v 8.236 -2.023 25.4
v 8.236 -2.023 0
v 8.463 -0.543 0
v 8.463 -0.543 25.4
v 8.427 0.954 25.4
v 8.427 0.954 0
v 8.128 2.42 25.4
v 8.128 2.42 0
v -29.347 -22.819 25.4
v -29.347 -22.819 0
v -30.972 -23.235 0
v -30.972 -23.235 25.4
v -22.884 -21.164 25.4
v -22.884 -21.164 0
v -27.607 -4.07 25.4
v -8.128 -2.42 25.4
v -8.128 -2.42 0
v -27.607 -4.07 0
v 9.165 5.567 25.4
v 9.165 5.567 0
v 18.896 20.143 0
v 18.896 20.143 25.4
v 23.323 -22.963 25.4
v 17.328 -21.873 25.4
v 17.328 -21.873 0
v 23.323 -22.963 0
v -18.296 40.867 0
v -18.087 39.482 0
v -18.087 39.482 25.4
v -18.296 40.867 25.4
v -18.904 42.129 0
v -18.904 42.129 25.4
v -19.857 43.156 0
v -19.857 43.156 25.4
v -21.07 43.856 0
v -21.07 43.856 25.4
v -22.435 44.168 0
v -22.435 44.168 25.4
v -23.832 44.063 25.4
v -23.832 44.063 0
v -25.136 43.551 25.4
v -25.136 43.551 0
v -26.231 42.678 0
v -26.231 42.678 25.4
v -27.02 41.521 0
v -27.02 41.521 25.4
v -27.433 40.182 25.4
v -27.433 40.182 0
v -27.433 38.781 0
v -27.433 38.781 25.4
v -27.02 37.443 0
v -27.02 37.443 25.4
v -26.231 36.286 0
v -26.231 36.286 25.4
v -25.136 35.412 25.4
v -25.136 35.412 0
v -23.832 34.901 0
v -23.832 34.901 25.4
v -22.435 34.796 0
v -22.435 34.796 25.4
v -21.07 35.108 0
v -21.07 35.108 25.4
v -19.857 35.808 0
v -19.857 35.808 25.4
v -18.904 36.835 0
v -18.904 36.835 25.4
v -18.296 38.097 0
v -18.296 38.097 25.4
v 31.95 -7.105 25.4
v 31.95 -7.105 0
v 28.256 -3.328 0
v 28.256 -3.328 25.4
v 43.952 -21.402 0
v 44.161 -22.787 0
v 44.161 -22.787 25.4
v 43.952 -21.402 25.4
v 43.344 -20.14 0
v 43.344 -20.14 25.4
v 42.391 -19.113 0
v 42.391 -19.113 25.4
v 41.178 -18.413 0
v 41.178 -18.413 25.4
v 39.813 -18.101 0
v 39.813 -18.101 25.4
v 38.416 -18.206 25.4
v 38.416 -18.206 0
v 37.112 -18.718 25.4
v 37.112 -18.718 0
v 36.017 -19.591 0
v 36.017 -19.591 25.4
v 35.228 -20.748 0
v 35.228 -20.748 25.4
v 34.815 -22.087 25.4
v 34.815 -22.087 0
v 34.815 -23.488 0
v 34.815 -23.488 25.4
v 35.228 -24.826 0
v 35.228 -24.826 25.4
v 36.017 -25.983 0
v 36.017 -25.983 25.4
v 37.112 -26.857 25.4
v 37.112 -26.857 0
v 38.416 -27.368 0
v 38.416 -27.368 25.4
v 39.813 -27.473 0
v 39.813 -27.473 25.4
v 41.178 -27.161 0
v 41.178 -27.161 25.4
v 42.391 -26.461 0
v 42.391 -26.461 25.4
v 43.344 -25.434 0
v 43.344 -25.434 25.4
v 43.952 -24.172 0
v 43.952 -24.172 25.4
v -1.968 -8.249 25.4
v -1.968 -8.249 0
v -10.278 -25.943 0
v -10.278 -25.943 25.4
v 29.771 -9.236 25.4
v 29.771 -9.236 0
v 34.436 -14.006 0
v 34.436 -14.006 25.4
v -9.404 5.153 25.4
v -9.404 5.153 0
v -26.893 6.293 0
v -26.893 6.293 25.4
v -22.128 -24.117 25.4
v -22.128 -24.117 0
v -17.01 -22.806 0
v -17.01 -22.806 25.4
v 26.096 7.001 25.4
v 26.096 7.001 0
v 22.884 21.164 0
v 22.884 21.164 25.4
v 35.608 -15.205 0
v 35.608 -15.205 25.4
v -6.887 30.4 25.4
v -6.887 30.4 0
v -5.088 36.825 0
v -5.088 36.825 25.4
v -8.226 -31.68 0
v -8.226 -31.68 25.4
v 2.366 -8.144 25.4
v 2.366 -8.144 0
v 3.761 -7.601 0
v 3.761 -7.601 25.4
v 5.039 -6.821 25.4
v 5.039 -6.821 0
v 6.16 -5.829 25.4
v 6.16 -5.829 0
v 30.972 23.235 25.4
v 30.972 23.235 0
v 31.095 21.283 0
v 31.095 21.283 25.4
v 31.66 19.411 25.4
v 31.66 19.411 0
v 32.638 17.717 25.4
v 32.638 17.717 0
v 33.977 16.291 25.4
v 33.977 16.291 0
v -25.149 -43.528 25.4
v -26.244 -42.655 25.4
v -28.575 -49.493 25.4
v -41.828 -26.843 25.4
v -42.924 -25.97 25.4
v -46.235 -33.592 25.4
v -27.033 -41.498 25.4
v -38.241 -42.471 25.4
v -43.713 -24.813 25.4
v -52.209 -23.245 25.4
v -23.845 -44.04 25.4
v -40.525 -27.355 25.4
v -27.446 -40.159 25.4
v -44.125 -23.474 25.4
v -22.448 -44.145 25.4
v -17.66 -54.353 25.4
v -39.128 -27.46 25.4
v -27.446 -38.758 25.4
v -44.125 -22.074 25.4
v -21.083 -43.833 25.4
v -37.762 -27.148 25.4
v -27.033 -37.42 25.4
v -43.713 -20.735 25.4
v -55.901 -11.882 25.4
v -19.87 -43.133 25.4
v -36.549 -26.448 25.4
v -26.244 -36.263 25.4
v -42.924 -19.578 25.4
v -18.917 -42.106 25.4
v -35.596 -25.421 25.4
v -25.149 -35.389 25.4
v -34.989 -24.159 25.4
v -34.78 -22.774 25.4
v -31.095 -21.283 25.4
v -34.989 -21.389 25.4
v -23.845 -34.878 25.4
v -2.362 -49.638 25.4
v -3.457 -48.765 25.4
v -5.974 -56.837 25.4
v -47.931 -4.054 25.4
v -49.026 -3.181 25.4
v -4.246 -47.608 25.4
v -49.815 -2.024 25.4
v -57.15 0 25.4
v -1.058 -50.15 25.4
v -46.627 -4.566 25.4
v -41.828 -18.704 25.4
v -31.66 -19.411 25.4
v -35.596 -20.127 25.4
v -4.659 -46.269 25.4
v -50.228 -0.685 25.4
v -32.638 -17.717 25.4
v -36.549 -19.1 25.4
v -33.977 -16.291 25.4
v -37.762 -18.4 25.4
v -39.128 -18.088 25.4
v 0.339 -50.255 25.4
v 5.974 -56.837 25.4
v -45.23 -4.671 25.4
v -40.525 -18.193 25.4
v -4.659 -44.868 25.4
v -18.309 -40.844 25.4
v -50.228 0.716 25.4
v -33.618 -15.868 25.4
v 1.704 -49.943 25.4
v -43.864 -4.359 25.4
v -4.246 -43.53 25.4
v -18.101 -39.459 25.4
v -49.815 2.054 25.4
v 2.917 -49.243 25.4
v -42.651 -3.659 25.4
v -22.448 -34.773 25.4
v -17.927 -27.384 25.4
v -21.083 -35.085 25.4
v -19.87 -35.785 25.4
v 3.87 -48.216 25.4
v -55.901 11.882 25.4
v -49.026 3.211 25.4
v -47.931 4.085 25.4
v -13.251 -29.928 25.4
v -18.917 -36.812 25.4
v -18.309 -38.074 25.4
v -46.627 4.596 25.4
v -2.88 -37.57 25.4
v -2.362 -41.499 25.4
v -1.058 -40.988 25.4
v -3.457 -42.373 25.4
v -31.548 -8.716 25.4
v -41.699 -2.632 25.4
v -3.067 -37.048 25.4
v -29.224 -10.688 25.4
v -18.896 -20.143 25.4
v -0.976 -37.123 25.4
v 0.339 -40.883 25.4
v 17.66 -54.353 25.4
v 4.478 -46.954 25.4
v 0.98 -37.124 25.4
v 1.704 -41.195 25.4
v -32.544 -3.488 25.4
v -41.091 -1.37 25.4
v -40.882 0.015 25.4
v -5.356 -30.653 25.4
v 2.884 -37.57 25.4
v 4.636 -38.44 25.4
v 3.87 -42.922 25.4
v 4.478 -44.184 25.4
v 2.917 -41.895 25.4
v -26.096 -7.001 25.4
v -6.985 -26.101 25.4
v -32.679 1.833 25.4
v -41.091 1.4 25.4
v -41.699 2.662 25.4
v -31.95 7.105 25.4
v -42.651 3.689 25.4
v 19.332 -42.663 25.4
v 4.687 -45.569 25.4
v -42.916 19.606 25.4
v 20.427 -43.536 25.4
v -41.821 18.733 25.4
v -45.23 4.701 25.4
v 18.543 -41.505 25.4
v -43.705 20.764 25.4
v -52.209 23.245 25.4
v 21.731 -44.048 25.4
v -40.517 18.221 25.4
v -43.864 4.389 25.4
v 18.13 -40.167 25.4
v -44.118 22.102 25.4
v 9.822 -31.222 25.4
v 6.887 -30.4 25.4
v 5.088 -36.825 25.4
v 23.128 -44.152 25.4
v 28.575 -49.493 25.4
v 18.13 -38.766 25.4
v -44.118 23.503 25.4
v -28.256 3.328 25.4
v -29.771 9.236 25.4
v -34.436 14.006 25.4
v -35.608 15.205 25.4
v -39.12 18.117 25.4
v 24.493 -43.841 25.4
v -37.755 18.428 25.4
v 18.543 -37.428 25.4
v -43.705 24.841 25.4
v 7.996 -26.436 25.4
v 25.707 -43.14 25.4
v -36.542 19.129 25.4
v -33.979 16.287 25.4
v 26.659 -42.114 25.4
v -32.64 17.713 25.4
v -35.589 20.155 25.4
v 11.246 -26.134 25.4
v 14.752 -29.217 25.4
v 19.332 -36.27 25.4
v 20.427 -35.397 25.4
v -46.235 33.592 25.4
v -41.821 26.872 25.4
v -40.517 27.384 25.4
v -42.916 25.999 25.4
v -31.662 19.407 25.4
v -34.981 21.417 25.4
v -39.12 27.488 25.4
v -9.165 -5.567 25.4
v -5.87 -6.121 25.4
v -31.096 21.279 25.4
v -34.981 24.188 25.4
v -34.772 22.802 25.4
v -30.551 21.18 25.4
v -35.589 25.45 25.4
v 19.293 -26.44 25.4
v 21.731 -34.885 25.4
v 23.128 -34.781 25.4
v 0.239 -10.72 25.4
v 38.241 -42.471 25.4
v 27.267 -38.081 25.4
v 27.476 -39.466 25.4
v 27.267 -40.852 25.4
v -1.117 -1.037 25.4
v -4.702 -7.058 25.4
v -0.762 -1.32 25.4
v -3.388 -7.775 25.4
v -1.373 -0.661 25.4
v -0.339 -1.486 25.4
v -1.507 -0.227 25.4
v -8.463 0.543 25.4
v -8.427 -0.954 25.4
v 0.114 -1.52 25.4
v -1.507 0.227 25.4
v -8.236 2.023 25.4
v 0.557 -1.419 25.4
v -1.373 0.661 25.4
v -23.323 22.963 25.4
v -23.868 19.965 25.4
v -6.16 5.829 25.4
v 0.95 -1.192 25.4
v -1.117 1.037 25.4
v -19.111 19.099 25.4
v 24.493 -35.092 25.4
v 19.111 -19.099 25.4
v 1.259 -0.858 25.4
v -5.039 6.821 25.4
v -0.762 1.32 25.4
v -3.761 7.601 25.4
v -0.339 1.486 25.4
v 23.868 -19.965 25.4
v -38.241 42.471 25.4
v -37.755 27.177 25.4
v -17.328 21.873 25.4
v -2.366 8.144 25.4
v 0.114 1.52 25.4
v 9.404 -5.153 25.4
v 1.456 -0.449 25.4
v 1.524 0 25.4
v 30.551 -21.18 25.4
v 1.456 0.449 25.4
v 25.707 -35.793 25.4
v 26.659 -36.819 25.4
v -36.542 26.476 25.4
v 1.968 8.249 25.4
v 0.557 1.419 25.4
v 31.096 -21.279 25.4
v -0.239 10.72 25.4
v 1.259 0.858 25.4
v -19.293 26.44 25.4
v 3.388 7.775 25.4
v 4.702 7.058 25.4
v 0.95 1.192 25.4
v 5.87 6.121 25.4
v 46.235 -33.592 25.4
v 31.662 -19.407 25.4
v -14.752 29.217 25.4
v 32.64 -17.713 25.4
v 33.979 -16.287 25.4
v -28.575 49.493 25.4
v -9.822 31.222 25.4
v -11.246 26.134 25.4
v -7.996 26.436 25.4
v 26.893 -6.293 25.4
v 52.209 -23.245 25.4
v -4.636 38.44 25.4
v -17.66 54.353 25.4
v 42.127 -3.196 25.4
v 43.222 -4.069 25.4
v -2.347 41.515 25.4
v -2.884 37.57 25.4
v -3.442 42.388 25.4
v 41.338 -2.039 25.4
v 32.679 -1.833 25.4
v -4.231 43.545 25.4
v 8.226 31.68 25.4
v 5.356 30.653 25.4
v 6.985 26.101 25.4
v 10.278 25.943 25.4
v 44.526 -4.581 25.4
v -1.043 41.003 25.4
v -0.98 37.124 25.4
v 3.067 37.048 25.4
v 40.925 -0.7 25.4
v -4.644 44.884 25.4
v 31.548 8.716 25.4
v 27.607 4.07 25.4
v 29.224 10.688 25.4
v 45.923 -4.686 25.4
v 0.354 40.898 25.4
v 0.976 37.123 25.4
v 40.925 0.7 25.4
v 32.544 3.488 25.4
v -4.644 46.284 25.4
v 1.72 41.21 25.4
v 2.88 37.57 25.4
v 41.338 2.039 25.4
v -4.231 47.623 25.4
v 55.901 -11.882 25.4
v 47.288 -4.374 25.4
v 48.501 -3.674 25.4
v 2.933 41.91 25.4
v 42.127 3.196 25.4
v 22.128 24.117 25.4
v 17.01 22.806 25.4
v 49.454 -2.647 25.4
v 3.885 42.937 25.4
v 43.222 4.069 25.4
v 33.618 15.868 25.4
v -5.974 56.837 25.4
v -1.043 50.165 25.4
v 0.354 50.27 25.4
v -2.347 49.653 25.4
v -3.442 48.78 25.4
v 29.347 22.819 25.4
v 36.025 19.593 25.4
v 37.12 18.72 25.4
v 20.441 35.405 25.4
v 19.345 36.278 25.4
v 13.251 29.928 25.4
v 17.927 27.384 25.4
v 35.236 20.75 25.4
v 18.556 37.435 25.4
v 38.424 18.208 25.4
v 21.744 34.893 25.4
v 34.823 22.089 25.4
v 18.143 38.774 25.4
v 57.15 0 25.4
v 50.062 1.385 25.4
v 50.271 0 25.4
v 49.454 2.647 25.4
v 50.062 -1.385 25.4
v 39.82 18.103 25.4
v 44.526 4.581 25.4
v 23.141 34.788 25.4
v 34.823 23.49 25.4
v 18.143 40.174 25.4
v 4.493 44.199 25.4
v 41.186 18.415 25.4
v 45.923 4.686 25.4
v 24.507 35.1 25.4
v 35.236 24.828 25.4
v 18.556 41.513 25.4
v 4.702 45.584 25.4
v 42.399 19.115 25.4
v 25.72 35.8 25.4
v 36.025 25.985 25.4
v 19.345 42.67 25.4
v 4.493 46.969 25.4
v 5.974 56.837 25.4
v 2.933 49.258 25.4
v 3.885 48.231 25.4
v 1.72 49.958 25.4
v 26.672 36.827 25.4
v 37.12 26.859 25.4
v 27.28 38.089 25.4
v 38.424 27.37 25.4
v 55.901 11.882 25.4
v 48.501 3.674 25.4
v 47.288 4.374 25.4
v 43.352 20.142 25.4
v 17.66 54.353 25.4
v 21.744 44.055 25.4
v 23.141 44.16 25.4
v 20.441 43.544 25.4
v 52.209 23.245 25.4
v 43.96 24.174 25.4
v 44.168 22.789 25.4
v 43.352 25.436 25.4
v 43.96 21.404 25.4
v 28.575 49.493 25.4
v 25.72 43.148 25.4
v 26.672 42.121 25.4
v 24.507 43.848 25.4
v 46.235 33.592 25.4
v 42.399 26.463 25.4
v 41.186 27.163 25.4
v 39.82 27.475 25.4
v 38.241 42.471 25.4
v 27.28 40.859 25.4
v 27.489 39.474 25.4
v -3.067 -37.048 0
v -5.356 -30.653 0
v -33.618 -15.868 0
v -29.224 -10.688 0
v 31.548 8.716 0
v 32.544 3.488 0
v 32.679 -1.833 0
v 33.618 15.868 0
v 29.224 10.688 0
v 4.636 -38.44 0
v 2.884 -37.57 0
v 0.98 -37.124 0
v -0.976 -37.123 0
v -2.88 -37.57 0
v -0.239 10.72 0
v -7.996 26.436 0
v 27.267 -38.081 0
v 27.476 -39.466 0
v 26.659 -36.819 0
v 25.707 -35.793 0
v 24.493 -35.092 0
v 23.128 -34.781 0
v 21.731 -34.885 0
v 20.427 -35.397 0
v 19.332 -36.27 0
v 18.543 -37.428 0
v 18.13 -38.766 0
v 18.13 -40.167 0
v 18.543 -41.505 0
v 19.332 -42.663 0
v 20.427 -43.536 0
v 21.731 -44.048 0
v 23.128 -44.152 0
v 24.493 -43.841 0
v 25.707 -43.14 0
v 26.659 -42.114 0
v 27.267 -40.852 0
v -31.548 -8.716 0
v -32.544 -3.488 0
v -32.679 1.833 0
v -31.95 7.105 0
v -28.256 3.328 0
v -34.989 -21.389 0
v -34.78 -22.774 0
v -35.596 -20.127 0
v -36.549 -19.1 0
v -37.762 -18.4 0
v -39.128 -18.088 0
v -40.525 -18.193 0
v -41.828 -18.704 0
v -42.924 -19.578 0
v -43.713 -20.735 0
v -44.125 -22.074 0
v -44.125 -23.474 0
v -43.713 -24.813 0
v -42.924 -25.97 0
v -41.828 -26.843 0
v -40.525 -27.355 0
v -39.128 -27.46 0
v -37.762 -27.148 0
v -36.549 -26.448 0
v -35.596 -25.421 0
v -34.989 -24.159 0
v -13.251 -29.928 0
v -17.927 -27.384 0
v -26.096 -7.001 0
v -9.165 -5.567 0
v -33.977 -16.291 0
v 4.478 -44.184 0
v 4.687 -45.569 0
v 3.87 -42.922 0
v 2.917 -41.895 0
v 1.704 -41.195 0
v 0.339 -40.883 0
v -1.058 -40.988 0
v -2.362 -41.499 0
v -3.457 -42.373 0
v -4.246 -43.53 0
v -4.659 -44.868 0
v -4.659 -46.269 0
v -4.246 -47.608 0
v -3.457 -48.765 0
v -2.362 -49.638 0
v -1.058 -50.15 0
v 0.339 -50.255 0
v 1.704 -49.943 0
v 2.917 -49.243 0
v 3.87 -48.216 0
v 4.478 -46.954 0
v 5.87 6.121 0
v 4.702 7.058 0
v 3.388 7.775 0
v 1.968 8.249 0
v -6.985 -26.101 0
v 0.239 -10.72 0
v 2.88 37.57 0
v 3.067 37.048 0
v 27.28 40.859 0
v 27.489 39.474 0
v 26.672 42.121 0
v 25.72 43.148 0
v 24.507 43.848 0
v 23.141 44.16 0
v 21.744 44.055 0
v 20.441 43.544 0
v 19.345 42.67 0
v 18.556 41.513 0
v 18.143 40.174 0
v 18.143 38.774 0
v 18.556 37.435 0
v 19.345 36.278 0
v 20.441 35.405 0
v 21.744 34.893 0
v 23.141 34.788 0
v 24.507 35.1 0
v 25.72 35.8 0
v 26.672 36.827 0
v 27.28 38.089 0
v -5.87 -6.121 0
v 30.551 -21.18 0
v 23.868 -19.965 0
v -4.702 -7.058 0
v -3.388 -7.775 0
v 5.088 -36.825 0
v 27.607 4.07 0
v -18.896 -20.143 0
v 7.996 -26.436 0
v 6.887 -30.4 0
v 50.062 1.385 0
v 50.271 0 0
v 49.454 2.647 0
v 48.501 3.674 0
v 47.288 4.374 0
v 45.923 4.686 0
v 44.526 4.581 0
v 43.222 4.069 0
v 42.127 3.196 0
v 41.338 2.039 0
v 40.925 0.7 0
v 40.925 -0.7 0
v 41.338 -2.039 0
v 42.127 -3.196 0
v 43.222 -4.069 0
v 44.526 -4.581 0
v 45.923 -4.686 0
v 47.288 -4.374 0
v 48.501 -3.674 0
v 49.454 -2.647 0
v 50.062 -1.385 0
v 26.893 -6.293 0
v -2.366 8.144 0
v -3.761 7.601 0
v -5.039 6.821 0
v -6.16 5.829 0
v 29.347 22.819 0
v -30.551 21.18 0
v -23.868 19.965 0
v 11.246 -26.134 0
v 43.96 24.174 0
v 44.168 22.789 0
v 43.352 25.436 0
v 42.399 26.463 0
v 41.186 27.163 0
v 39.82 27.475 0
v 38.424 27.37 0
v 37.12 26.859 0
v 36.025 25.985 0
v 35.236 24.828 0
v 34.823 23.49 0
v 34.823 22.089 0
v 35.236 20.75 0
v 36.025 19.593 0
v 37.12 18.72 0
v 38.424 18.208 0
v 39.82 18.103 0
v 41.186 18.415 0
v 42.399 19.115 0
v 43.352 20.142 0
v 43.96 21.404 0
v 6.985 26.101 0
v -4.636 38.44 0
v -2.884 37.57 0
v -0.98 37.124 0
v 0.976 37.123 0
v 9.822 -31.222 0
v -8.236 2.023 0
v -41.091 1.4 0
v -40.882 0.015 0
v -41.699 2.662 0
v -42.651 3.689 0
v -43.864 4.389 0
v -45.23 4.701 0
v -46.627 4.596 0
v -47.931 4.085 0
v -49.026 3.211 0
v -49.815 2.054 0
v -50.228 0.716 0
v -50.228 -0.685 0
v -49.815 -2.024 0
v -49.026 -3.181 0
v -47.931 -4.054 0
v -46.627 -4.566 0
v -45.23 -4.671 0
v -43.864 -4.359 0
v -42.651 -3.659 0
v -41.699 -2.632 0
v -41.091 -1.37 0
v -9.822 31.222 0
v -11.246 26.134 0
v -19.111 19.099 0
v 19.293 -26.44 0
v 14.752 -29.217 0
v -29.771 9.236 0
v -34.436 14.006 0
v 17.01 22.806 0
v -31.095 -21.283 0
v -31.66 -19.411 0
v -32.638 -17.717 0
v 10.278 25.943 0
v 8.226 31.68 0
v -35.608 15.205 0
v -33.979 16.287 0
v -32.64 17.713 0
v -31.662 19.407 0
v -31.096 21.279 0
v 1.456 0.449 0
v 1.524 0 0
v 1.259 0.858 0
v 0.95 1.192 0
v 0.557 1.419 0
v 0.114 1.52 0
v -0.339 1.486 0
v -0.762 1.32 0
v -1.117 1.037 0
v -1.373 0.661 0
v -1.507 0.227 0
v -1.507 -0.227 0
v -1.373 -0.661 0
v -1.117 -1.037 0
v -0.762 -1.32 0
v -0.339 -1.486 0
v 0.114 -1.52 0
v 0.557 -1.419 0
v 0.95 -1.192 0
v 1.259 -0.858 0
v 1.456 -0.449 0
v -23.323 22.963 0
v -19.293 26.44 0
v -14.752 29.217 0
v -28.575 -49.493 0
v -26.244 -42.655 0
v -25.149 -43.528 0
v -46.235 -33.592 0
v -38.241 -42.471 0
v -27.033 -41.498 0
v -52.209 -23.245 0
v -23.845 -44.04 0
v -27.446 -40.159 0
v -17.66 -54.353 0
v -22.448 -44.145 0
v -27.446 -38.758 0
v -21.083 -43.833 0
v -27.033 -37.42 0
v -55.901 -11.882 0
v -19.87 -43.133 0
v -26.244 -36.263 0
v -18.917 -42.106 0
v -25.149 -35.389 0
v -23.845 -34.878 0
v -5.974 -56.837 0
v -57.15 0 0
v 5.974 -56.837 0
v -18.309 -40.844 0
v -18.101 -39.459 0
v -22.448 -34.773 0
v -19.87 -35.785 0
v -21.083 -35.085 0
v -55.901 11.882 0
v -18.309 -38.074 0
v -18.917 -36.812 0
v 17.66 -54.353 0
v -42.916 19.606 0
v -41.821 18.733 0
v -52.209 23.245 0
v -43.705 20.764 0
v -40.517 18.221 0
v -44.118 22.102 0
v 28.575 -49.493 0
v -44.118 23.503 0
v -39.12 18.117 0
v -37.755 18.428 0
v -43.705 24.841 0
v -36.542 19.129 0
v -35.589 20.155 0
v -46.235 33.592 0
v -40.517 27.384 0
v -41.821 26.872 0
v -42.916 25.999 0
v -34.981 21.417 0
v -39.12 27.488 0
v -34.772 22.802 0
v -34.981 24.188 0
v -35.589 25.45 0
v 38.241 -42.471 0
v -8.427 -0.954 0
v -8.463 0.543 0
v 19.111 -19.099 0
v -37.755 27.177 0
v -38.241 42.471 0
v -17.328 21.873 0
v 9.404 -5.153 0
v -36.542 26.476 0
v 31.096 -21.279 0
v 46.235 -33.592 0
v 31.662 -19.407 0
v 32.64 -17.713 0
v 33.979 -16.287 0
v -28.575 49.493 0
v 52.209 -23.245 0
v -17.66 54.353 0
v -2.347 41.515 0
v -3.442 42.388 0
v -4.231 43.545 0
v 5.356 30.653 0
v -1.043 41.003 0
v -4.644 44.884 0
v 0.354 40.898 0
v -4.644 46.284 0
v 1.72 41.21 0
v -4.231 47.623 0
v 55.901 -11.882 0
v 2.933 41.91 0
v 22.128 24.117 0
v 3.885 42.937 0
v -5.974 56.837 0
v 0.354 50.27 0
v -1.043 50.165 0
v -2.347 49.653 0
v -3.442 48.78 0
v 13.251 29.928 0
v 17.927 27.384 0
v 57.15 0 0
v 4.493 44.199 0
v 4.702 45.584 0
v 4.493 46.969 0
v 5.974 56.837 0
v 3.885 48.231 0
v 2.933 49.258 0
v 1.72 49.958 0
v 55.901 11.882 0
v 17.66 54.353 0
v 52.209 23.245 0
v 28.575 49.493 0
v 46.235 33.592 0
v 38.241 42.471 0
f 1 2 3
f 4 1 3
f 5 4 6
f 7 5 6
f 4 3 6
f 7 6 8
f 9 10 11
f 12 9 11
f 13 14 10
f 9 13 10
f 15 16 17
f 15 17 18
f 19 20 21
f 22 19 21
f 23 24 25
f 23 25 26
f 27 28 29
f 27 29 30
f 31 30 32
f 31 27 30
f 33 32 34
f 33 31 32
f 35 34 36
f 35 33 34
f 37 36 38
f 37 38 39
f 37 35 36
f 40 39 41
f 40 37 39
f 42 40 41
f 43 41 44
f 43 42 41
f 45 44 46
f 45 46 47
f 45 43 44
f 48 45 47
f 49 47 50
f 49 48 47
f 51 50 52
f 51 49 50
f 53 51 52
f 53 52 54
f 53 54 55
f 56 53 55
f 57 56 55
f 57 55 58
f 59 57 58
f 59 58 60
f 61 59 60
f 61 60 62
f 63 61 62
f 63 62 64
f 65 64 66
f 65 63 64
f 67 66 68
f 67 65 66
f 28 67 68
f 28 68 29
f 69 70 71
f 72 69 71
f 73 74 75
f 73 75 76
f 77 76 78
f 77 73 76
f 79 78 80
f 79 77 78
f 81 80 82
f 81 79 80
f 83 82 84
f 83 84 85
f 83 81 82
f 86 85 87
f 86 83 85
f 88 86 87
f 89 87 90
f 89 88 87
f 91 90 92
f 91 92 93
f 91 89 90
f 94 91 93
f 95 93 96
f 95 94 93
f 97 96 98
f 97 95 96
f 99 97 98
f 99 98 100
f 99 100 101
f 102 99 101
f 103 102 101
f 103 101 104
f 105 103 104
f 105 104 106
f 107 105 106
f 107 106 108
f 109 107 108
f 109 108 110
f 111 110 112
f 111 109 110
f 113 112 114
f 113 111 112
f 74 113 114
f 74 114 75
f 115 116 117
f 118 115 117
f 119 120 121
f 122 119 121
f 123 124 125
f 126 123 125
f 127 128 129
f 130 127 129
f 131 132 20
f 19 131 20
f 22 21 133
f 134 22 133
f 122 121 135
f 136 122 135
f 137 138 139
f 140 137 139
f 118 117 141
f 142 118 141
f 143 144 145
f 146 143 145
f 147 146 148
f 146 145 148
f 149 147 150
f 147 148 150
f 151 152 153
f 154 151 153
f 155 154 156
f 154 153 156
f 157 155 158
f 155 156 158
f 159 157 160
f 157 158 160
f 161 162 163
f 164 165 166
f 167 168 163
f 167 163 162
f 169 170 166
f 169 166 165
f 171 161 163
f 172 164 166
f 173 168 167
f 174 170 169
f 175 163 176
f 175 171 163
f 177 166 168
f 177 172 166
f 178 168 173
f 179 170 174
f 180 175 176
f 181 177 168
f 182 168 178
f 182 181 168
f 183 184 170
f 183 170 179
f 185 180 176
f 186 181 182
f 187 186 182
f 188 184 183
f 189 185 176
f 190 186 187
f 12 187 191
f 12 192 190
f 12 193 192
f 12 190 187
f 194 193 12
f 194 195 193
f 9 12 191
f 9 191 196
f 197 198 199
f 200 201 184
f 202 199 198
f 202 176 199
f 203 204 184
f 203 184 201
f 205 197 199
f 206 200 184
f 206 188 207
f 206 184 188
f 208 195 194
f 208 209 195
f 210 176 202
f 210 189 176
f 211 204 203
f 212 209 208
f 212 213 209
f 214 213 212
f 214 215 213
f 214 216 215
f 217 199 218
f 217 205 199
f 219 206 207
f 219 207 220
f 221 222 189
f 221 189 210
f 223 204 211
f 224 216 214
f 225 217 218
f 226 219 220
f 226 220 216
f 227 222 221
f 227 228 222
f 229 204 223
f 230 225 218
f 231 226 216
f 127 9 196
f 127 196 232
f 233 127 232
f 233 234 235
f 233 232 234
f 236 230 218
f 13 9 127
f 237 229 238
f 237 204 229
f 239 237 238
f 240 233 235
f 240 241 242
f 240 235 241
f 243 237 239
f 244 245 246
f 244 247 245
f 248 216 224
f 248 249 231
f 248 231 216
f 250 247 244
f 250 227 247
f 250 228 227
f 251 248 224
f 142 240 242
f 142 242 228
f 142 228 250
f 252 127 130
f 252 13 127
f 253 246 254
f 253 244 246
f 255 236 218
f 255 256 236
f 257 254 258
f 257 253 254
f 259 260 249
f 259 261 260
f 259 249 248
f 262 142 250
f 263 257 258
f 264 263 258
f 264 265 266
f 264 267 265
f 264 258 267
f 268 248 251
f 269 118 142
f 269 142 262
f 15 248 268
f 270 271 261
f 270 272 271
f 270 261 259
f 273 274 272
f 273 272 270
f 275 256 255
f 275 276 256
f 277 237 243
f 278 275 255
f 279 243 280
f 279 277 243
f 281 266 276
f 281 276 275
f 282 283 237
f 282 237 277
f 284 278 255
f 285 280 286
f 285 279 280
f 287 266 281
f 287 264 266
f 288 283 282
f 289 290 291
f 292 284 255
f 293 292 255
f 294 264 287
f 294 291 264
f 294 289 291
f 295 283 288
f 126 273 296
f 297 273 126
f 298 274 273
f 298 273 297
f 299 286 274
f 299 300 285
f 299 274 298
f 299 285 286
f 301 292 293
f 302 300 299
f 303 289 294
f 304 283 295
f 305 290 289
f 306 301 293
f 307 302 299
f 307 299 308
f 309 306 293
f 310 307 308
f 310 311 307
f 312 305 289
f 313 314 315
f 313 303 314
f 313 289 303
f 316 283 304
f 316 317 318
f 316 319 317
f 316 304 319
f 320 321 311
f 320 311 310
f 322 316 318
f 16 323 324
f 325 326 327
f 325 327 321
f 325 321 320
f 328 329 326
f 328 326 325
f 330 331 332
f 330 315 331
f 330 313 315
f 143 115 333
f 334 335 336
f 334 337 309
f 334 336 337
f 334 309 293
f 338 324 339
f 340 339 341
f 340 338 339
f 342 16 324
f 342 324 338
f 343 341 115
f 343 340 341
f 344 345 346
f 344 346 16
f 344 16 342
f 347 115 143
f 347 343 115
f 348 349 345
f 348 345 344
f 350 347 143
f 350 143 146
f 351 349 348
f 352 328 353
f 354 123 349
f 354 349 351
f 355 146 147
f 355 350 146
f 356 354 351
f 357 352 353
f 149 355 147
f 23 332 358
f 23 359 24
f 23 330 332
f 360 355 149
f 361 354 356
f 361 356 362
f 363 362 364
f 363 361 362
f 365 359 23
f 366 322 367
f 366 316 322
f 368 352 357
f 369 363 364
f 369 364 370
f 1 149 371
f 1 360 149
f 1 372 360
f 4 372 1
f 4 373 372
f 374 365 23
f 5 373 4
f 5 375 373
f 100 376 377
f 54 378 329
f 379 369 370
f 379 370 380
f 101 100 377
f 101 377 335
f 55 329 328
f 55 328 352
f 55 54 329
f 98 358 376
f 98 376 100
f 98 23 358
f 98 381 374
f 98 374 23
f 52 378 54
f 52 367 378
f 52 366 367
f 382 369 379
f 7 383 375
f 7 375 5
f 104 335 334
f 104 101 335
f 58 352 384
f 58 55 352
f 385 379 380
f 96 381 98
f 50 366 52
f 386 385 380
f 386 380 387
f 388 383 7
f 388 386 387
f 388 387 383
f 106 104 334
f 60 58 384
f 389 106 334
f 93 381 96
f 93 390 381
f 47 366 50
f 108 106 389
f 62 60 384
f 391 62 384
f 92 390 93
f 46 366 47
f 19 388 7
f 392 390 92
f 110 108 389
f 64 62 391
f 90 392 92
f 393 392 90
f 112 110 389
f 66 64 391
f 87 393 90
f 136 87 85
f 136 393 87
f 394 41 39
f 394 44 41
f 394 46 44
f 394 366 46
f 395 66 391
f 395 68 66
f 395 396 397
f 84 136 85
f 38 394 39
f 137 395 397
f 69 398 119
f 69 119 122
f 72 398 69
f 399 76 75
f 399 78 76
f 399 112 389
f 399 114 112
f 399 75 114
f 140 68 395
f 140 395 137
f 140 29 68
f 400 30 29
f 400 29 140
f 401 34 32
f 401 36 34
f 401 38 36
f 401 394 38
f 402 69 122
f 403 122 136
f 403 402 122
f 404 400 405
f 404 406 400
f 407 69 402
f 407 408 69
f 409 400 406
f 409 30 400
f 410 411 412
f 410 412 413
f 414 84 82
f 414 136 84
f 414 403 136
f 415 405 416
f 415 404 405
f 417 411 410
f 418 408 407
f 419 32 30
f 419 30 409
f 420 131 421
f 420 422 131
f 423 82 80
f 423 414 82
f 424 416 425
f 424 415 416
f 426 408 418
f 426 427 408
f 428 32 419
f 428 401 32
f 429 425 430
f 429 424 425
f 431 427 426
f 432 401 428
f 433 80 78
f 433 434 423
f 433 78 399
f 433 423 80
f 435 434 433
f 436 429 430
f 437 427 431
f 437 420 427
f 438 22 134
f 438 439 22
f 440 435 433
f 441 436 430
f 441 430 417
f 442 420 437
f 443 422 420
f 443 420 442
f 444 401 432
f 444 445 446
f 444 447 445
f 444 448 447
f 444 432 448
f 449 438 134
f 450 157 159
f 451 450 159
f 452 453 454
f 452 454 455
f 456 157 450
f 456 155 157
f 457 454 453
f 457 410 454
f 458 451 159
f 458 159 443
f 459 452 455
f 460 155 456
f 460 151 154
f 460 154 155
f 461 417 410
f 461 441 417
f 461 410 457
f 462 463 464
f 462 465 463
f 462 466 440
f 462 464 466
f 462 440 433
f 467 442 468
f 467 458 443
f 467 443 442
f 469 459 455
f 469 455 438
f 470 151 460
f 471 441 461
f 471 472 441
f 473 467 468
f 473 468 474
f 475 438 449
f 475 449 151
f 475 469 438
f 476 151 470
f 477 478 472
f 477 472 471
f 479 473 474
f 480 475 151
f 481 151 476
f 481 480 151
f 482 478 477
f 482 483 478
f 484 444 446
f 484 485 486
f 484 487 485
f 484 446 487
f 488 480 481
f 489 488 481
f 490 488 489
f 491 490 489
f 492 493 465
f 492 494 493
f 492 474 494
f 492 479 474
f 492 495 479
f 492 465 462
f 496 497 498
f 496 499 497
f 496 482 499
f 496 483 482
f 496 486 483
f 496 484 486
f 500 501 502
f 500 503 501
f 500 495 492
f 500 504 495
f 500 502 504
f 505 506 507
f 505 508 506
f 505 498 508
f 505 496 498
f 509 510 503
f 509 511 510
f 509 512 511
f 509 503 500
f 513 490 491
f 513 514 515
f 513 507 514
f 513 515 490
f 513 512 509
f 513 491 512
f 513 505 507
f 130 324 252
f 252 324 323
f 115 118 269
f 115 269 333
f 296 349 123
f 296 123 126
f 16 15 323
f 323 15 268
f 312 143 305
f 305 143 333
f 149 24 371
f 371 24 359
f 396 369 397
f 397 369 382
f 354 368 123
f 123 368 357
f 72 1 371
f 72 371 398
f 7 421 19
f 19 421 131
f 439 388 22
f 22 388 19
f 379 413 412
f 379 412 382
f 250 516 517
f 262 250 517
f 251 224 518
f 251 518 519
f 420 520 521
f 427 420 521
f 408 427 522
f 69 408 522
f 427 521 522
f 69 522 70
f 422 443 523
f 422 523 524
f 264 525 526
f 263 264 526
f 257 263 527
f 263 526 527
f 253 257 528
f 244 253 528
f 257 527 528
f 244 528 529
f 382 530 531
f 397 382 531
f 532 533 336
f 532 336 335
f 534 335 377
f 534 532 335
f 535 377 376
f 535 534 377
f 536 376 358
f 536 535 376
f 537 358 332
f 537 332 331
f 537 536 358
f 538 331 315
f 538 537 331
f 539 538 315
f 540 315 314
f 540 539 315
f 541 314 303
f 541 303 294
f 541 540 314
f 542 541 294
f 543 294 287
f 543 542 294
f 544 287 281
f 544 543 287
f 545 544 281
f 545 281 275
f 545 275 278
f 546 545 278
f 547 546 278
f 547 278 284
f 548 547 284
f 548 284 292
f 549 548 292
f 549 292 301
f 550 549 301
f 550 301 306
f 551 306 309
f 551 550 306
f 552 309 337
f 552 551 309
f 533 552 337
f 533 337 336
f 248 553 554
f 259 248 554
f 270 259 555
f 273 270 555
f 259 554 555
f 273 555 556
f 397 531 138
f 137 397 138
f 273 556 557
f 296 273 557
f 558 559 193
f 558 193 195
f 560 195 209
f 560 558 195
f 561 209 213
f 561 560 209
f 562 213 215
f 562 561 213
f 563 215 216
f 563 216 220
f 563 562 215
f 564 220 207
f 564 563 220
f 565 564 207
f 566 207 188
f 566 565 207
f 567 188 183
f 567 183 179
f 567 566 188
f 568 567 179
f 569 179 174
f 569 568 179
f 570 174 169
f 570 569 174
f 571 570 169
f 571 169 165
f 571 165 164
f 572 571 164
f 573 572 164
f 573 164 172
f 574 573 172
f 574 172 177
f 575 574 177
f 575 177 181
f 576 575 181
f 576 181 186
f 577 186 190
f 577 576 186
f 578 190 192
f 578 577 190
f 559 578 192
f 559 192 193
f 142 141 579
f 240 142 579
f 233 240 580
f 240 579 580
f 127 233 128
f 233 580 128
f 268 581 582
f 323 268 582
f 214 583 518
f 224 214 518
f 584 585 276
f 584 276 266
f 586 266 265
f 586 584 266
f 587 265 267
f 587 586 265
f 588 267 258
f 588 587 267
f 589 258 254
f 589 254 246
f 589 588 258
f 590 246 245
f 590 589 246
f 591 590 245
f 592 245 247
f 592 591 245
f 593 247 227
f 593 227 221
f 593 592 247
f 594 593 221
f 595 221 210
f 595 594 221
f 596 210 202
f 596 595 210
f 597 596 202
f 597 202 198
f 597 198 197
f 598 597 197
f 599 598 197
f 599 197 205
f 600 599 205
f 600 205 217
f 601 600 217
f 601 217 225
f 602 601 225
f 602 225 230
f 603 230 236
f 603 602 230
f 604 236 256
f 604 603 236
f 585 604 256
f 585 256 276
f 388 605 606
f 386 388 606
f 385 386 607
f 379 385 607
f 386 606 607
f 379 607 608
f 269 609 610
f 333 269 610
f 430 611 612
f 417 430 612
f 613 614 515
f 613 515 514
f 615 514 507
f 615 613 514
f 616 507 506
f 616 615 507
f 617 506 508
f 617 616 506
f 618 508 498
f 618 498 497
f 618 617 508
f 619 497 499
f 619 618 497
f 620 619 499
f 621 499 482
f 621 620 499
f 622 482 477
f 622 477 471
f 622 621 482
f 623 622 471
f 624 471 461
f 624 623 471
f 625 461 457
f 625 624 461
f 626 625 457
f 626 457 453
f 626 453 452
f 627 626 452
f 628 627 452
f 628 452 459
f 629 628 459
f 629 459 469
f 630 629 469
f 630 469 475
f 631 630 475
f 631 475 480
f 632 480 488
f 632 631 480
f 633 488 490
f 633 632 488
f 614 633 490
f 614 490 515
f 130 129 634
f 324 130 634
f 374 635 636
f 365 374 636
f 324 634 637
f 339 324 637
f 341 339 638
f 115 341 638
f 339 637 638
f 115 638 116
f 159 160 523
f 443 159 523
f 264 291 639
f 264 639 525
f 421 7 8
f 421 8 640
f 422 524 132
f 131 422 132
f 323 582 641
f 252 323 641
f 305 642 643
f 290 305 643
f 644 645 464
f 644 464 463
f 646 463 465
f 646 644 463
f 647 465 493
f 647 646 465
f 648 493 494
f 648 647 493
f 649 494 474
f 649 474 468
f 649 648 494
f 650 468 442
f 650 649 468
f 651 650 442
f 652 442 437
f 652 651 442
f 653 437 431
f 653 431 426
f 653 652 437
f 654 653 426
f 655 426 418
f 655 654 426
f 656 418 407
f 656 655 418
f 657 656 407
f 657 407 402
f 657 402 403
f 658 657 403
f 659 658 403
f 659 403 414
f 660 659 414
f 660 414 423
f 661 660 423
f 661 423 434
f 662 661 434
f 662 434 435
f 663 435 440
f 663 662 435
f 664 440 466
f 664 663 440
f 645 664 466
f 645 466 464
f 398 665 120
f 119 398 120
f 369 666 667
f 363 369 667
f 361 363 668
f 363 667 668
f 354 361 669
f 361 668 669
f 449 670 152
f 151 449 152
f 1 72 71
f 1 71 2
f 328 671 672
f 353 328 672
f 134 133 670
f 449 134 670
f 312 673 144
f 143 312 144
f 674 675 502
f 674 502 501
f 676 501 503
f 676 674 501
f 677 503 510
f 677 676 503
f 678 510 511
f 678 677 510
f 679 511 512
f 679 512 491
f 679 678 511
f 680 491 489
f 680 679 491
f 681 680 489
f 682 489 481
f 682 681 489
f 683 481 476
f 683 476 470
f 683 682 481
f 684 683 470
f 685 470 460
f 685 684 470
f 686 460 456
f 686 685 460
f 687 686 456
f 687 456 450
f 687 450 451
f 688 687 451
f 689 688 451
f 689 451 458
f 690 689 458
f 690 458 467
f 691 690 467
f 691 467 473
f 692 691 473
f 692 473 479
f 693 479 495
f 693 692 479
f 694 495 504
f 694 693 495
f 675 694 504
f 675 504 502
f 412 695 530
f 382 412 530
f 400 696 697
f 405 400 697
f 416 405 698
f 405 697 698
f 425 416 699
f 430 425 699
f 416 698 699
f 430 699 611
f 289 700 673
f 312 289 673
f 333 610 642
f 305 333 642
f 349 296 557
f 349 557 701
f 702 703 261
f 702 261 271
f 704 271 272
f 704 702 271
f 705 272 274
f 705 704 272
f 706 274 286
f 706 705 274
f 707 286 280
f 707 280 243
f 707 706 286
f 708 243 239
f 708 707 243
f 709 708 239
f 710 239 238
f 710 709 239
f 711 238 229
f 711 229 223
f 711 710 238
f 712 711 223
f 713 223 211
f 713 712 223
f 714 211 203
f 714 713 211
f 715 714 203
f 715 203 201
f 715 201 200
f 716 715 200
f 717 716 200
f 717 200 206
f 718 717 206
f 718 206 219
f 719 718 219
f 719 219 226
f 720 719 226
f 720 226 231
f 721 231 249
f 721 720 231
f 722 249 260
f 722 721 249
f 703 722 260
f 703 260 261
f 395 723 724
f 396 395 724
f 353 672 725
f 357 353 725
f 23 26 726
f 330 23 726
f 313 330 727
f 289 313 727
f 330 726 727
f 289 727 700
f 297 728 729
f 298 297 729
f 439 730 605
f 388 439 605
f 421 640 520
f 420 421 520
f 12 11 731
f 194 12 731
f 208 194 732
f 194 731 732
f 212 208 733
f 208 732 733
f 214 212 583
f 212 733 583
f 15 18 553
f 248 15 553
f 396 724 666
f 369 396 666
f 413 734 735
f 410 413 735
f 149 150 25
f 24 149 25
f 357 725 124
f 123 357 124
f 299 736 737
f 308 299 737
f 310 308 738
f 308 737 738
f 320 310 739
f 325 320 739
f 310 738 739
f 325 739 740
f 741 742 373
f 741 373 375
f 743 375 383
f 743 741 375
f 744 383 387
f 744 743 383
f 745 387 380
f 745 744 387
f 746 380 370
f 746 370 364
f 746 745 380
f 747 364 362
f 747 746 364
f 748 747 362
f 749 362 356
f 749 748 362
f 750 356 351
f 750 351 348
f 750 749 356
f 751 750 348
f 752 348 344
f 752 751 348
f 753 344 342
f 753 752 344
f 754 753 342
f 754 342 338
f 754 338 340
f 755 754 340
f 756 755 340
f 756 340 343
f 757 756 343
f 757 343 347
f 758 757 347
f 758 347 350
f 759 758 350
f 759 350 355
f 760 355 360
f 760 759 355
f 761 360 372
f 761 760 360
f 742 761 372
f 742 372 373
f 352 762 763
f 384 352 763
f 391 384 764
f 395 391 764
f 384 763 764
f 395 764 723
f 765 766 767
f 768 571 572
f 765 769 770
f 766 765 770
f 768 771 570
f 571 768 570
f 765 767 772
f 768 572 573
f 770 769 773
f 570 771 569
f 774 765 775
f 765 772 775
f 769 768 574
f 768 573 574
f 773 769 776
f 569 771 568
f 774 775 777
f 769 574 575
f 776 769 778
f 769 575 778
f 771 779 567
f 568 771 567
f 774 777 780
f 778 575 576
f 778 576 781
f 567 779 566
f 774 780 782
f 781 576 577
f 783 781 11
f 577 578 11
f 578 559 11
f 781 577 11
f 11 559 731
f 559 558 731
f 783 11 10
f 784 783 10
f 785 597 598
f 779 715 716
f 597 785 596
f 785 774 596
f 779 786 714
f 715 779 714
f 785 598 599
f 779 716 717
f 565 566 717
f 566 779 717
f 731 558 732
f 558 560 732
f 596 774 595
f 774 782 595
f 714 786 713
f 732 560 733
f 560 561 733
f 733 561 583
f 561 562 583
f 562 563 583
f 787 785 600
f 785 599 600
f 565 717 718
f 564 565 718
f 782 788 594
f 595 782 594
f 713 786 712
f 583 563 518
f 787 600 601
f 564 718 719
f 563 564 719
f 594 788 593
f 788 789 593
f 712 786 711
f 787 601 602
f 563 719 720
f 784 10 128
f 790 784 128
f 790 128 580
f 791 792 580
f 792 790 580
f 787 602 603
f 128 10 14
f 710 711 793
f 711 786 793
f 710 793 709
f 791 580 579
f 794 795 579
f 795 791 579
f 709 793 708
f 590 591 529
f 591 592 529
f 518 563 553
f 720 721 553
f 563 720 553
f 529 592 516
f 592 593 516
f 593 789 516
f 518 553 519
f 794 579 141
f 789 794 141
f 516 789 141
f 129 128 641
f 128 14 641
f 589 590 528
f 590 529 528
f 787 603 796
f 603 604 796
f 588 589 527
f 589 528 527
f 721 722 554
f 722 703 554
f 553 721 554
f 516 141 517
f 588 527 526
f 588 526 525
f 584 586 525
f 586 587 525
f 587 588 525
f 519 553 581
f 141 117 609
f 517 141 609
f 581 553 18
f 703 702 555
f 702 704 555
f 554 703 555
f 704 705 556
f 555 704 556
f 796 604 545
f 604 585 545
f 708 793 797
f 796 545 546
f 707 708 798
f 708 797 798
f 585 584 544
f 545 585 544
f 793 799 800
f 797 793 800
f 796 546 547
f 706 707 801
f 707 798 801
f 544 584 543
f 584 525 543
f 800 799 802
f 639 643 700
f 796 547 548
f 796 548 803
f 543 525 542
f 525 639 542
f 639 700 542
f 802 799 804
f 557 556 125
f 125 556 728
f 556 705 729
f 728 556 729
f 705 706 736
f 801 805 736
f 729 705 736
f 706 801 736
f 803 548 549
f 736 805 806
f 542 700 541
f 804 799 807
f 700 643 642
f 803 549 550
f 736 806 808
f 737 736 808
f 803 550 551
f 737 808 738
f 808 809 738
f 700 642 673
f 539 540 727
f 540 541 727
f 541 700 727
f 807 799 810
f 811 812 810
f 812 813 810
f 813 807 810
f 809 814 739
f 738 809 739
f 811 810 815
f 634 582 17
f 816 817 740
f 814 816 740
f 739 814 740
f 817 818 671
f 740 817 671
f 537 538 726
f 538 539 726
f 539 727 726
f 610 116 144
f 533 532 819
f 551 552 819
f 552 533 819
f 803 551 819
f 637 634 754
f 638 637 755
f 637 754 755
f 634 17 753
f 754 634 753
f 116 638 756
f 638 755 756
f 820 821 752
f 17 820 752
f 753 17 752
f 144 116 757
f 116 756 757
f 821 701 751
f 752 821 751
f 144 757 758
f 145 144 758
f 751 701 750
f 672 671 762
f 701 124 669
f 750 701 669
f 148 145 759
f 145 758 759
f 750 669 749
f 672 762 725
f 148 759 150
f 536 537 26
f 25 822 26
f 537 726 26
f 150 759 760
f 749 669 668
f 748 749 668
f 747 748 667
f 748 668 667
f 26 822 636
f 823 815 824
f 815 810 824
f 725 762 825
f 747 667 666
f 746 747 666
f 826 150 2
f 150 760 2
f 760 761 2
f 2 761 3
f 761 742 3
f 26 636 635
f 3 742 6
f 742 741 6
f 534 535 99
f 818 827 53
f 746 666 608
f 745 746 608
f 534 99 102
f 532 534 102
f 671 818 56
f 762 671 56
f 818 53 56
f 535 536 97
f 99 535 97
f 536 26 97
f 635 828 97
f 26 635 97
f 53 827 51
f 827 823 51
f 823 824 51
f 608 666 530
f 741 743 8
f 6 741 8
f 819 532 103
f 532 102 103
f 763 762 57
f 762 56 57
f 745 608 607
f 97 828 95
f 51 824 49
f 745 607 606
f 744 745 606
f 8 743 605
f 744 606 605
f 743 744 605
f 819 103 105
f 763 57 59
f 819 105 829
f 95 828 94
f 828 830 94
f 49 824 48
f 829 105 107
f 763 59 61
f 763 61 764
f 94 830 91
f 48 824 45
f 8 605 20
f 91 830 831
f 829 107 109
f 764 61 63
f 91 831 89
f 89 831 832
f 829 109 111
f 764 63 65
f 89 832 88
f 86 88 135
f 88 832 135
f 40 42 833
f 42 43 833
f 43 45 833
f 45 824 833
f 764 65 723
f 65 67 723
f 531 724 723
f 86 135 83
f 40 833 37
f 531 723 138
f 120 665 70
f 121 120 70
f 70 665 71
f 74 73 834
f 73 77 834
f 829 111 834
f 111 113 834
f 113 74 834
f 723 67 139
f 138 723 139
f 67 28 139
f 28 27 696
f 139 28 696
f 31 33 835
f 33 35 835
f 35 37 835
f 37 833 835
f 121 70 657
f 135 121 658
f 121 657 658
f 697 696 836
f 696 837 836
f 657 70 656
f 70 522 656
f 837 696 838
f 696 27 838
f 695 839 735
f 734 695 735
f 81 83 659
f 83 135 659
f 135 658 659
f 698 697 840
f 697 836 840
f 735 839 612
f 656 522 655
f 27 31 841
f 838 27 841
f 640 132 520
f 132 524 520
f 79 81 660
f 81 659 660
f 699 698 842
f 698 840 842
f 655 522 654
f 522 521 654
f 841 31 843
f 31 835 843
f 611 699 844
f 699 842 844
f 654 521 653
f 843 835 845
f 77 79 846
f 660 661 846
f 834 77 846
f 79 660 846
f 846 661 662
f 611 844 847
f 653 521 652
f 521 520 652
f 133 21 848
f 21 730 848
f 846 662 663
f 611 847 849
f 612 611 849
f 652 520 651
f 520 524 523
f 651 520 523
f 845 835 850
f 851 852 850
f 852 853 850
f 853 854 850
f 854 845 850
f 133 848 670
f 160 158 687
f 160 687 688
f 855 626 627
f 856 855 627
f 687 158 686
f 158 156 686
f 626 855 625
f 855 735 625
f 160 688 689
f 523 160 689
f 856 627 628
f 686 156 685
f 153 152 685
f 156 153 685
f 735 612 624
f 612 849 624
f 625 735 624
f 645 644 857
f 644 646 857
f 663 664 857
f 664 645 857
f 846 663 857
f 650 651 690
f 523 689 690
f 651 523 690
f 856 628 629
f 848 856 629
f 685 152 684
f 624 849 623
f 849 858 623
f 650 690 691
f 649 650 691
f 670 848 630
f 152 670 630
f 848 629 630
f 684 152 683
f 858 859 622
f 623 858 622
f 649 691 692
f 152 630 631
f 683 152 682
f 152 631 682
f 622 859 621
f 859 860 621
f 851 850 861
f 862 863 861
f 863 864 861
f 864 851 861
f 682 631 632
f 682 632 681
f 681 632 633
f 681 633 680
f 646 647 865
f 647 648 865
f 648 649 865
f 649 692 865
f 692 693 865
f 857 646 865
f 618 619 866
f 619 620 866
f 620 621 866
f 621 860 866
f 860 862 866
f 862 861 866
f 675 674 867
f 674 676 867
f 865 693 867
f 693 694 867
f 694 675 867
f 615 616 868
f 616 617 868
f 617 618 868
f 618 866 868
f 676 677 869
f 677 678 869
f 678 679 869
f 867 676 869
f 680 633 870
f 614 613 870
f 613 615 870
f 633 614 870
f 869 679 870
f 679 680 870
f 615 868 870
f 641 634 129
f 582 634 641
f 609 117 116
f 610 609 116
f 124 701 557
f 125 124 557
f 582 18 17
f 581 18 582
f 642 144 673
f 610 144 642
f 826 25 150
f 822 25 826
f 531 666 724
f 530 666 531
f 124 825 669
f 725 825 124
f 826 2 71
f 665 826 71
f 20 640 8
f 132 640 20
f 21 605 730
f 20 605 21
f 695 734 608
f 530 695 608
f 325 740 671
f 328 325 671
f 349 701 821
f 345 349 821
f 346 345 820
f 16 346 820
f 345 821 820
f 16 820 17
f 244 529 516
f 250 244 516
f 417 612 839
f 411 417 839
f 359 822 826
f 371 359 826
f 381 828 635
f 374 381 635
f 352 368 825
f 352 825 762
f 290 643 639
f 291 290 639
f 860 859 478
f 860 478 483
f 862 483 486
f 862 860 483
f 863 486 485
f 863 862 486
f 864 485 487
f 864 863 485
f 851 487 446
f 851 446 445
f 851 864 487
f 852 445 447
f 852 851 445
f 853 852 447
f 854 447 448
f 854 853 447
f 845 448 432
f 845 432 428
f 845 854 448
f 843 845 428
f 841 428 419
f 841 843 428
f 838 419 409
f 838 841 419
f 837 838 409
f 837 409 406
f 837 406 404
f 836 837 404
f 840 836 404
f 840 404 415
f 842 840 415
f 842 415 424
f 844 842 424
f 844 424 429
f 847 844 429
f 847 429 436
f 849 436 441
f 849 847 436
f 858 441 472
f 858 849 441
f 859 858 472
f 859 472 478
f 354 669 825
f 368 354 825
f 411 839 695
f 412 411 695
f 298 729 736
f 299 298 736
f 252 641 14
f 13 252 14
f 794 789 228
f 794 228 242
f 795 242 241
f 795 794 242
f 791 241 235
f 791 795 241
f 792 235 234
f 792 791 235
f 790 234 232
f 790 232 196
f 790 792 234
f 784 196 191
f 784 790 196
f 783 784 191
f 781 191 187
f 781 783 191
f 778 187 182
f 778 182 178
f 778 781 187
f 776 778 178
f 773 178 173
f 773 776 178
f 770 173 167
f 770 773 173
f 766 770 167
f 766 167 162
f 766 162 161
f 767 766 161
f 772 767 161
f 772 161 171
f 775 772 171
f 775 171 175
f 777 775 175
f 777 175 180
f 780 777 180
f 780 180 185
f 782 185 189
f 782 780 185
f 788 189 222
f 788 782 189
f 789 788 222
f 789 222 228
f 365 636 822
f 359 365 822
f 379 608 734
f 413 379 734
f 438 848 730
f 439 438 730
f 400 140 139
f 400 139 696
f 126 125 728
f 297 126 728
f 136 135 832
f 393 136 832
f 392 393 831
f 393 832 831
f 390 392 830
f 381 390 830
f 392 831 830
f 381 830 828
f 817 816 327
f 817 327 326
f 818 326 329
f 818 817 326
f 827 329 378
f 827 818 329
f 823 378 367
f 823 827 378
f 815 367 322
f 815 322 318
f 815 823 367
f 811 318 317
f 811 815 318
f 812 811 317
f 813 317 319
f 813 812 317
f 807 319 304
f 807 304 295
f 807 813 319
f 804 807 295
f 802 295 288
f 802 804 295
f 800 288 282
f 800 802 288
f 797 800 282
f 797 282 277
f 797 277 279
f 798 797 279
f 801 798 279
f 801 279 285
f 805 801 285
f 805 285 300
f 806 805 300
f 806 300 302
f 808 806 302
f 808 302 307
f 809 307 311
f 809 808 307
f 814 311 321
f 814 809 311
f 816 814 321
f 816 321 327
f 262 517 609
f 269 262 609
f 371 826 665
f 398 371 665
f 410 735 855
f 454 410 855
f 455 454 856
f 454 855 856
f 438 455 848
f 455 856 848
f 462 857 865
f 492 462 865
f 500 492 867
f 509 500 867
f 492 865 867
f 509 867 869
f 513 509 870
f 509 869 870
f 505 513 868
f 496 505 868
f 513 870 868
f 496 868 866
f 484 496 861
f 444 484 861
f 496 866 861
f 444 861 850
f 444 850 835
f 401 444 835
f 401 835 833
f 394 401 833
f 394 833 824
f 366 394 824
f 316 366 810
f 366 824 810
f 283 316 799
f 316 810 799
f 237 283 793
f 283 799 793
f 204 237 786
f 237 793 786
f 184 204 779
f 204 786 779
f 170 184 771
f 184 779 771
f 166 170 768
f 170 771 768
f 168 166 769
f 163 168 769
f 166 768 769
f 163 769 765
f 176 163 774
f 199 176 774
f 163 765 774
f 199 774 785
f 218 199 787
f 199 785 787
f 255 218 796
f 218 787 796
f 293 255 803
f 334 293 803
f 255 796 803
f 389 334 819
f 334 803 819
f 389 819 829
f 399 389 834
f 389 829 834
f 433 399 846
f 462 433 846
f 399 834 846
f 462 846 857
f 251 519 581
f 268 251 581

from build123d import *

# Parameters (mm, degrees)
F0_R     = 57.15
F0_R_2   = 4.699
F0_R_3   = 1.524
F1_DEPTH = 25.4


with BuildPart() as f1:
    # F0 (on Top) → F1 (new body)
    with BuildSketch(Plane.XY):
        Circle(F0_R)
        with Locations((-0.012471, -45.568732)):
            Circle(F0_R_2, mode=Mode.SUBTRACT)
        with Locations((-22.799638, -39.458828)):
            Circle(F0_R_2, mode=Mode.SUBTRACT)
        with Locations((-39.478951, -22.773912)):
            Circle(F0_R_2, mode=Mode.SUBTRACT)
        with BuildLine():
            Line((-9.164514, -5.567105), (-18.896484, -20.143289))
            Line((-18.896484, -20.143289), (-22.883833, -21.164274))
            Line((-22.883833, -21.164274), (-29.347375, -22.819305))
            Line((-29.347375, -22.819305), (-30.972017, -23.235305))
            ThreePointArc((-30.972017, -23.235305), (-31.659849, -19.410562), (-33.976573, -16.290536))
            Line((-33.976573, -16.290536), (-33.618292, -15.868193))
            Line((-33.618292, -15.868193), (-29.22395, -10.68813))
            Line((-29.22395, -10.68813), (-26.096301, -7.001249))
            Line((-26.096301, -7.001249), (-9.164514, -5.567105))
        make_face(mode=Mode.SUBTRACT)
        with BuildLine():
            Line((-17.009683, -22.806496), (-5.869526, -6.121182))
            ThreePointArc((-5.869526, -6.121182), (-4.06054, -7.445281), (-1.967811, -8.249117))
            Line((-1.967811, -8.249117), (-10.278486, -25.94343))
            Line((-10.278486, -25.94343), (-8.225538, -31.679786))
            ThreePointArc((-8.225538, -31.679786), (-15.640641, -28.751325), (-22.127766, -24.117013))
            Line((-22.127766, -24.117013), (-17.009683, -22.806496))
        make_face(mode=Mode.SUBTRACT)
        with BuildLine():
            Line((-28.255846, 3.327569), (-8.235862, 2.022568))
            ThreePointArc((-8.235862, 2.022568), (-8.478073, -0.20611), (-8.12785, -2.420384))
            Line((-8.12785, -2.420384), (-27.606912, -4.070285))
            Line((-27.606912, -4.070285), (-31.548269, -8.716368))
            ThreePointArc((-31.548269, -8.716368), (-32.719698, -0.83047), (-31.949829, 7.104701))
            Line((-31.949829, 7.104701), (-28.255846, 3.327569))
        make_face(mode=Mode.SUBTRACT)
        with Locations((22.776746, -39.46648)):
            Circle(F0_R_2, mode=Mode.SUBTRACT)
        with BuildLine():
            Line((0.238997, -10.720255), (7.996358, -26.43648))
            Line((7.996358, -26.43648), (6.886883, -30.400118))
            Line((6.886883, -30.400118), (5.08841, -36.825225))
            Line((5.08841, -36.825225), (4.636356, -38.440205))
            ThreePointArc((4.636356, -38.440205), (0.980115, -37.123514), (-2.880269, -37.569844))
            Line((-2.880269, -37.569844), (-3.066888, -37.048391))
            Line((-3.066888, -37.048391), (-5.355783, -30.652748))
            Line((-5.355783, -30.652748), (-6.984892, -26.100684))
            Line((-6.984892, -26.100684), (0.238997, -10.720255))
        make_face(mode=Mode.SUBTRACT)
        with BuildLine():
            Line((11.246163, -26.134065), (2.366336, -8.143749))
            ThreePointArc((2.366336, -8.143749), (4.417533, -7.239172), (6.160039, -5.828732))
            Line((6.160039, -5.828732), (17.328426, -21.873144))
            Line((17.328426, -21.873144), (23.32273, -22.963418))
            ThreePointArc((23.32273, -22.963418), (17.079057, -27.920855), (9.822063, -31.221714))
            Line((9.822063, -31.221714), (11.246163, -26.134065))
        make_face(mode=Mode.SUBTRACT)
        with BuildLine():
            Line((9.403511, -5.15315), (26.892842, -6.293191))
            Line((26.892842, -6.293191), (29.770716, -9.235843))
            Line((29.770716, -9.235843), (34.435785, -14.00592))
            Line((34.435785, -14.00592), (35.608372, -15.204901))
            ThreePointArc((35.608372, -15.204901), (32.639964, -17.712953), (31.096305, -21.279308))
            Line((31.096305, -21.279308), (30.551404, -21.180199))
            Line((30.551404, -21.180199), (23.868167, -19.964618))
            Line((23.868167, -19.964618), (19.11141, -19.099436))
            Line((19.11141, -19.099436), (9.403511, -5.15315))
        make_face(mode=Mode.SUBTRACT)
        with Locations((39.461662, -22.787167)):
            Circle(F0_R_2, mode=Mode.SUBTRACT)
        with Locations((-45.581203, 0.015305)):
            Circle(F0_R_2, mode=Mode.SUBTRACT)
        with Locations((-39.471299, 22.802472)):
            Circle(F0_R_2, mode=Mode.SUBTRACT)
        with BuildLine():
            Line((-9.403511, 5.15315), (-26.892842, 6.293191))
            Line((-26.892842, 6.293191), (-29.770716, 9.235843))
            Line((-29.770716, 9.235843), (-34.435785, 14.00592))
            Line((-34.435785, 14.00592), (-35.608372, 15.204901))
            ThreePointArc((-35.608372, 15.204901), (-32.639964, 17.712953), (-31.096305, 21.279308))
            Line((-31.096305, 21.279308), (-30.551404, 21.180199))
            Line((-30.551404, 21.180199), (-23.868167, 19.964618))
            Line((-23.868167, 19.964618), (-19.11141, 19.099436))
            Line((-19.11141, 19.099436), (-9.403511, 5.15315))
        make_face(mode=Mode.SUBTRACT)
        with BuildLine():
            Line((-11.246163, 26.134065), (-2.366336, 8.143749))
            ThreePointArc((-2.366336, 8.143749), (-4.417533, 7.239172), (-6.160039, 5.828732))
            Line((-6.160039, 5.828732), (-17.328426, 21.873144))
            Line((-17.328426, 21.873144), (-23.32273, 22.963418))
            ThreePointArc((-23.32273, 22.963418), (-17.079057, 27.920855), (-9.822063, 31.221714))
            Line((-9.822063, 31.221714), (-11.246163, 26.134065))
        make_face(mode=Mode.SUBTRACT)
        with BuildLine():
            Line((-0.238997, 10.720255), (-7.996358, 26.43648))
            Line((-7.996358, 26.43648), (-6.886883, 30.400118))
            Line((-6.886883, 30.400118), (-5.08841, 36.825225))
            Line((-5.08841, 36.825225), (-4.636356, 38.440205))
            ThreePointArc((-4.636356, 38.440205), (-0.980115, 37.123514), (2.880269, 37.569844))
            Line((2.880269, 37.569844), (3.066888, 37.048391))
            Line((3.066888, 37.048391), (5.355783, 30.652748))
            Line((5.355783, 30.652748), (6.984892, 26.100684))
            Line((6.984892, 26.100684), (-0.238997, 10.720255))
        make_face(mode=Mode.SUBTRACT)
        with Locations((-22.786383, 39.481785)):
            Circle(F0_R_2, mode=Mode.SUBTRACT)
        Circle(F0_R_3, mode=Mode.SUBTRACT)
        with BuildLine():
            Line((28.255846, -3.327569), (8.235862, -2.022568))
            ThreePointArc((8.235862, -2.022568), (8.478073, 0.20611), (8.12785, 2.420384))
            Line((8.12785, 2.420384), (27.606912, 4.070285))
            Line((27.606912, 4.070285), (31.548269, 8.716368))
            ThreePointArc((31.548269, 8.716368), (32.719698, 0.83047), (31.949829, -7.104701))
            Line((31.949829, -7.104701), (28.255846, -3.327569))
        make_face(mode=Mode.SUBTRACT)
        with BuildLine():
            Line((17.009683, 22.806496), (5.869526, 6.121182))
            ThreePointArc((5.869526, 6.121182), (4.06054, 7.445281), (1.967811, 8.249117))
            Line((1.967811, 8.249117), (10.278486, 25.94343))
            Line((10.278486, 25.94343), (8.225538, 31.679786))
            ThreePointArc((8.225538, 31.679786), (15.640641, 28.751325), (22.127766, 24.117013))
            Line((22.127766, 24.117013), (17.009683, 22.806496))
        make_face(mode=Mode.SUBTRACT)
        with BuildLine():
            Line((9.164514, 5.567105), (18.896484, 20.143289))
            Line((18.896484, 20.143289), (22.883833, 21.164274))
            Line((22.883833, 21.164274), (29.347375, 22.819305))
            Line((29.347375, 22.819305), (30.972017, 23.235305))
            ThreePointArc((30.972017, 23.235305), (31.659849, 19.410562), (33.976573, 16.290536))
            Line((33.976573, 16.290536), (33.618292, 15.868193))
            Line((33.618292, 15.868193), (29.22395, 10.68813))
            Line((29.22395, 10.68813), (26.096301, 7.001249))
            Line((26.096301, 7.001249), (9.164514, 5.567105))
        make_face(mode=Mode.SUBTRACT)
        with Locations((45.571566, 0)):
            Circle(F0_R_2, mode=Mode.SUBTRACT)
        with Locations((39.469314, 22.789217)):
            Circle(F0_R_2, mode=Mode.SUBTRACT)
        with Locations((22.790001, 39.474133)):
            Circle(F0_R_2, mode=Mode.SUBTRACT)
        with Locations((0.002834, 45.584037)):
            Circle(F0_R_2, mode=Mode.SUBTRACT)
    extrude(amount=F1_DEPTH)


solid = f1.part
